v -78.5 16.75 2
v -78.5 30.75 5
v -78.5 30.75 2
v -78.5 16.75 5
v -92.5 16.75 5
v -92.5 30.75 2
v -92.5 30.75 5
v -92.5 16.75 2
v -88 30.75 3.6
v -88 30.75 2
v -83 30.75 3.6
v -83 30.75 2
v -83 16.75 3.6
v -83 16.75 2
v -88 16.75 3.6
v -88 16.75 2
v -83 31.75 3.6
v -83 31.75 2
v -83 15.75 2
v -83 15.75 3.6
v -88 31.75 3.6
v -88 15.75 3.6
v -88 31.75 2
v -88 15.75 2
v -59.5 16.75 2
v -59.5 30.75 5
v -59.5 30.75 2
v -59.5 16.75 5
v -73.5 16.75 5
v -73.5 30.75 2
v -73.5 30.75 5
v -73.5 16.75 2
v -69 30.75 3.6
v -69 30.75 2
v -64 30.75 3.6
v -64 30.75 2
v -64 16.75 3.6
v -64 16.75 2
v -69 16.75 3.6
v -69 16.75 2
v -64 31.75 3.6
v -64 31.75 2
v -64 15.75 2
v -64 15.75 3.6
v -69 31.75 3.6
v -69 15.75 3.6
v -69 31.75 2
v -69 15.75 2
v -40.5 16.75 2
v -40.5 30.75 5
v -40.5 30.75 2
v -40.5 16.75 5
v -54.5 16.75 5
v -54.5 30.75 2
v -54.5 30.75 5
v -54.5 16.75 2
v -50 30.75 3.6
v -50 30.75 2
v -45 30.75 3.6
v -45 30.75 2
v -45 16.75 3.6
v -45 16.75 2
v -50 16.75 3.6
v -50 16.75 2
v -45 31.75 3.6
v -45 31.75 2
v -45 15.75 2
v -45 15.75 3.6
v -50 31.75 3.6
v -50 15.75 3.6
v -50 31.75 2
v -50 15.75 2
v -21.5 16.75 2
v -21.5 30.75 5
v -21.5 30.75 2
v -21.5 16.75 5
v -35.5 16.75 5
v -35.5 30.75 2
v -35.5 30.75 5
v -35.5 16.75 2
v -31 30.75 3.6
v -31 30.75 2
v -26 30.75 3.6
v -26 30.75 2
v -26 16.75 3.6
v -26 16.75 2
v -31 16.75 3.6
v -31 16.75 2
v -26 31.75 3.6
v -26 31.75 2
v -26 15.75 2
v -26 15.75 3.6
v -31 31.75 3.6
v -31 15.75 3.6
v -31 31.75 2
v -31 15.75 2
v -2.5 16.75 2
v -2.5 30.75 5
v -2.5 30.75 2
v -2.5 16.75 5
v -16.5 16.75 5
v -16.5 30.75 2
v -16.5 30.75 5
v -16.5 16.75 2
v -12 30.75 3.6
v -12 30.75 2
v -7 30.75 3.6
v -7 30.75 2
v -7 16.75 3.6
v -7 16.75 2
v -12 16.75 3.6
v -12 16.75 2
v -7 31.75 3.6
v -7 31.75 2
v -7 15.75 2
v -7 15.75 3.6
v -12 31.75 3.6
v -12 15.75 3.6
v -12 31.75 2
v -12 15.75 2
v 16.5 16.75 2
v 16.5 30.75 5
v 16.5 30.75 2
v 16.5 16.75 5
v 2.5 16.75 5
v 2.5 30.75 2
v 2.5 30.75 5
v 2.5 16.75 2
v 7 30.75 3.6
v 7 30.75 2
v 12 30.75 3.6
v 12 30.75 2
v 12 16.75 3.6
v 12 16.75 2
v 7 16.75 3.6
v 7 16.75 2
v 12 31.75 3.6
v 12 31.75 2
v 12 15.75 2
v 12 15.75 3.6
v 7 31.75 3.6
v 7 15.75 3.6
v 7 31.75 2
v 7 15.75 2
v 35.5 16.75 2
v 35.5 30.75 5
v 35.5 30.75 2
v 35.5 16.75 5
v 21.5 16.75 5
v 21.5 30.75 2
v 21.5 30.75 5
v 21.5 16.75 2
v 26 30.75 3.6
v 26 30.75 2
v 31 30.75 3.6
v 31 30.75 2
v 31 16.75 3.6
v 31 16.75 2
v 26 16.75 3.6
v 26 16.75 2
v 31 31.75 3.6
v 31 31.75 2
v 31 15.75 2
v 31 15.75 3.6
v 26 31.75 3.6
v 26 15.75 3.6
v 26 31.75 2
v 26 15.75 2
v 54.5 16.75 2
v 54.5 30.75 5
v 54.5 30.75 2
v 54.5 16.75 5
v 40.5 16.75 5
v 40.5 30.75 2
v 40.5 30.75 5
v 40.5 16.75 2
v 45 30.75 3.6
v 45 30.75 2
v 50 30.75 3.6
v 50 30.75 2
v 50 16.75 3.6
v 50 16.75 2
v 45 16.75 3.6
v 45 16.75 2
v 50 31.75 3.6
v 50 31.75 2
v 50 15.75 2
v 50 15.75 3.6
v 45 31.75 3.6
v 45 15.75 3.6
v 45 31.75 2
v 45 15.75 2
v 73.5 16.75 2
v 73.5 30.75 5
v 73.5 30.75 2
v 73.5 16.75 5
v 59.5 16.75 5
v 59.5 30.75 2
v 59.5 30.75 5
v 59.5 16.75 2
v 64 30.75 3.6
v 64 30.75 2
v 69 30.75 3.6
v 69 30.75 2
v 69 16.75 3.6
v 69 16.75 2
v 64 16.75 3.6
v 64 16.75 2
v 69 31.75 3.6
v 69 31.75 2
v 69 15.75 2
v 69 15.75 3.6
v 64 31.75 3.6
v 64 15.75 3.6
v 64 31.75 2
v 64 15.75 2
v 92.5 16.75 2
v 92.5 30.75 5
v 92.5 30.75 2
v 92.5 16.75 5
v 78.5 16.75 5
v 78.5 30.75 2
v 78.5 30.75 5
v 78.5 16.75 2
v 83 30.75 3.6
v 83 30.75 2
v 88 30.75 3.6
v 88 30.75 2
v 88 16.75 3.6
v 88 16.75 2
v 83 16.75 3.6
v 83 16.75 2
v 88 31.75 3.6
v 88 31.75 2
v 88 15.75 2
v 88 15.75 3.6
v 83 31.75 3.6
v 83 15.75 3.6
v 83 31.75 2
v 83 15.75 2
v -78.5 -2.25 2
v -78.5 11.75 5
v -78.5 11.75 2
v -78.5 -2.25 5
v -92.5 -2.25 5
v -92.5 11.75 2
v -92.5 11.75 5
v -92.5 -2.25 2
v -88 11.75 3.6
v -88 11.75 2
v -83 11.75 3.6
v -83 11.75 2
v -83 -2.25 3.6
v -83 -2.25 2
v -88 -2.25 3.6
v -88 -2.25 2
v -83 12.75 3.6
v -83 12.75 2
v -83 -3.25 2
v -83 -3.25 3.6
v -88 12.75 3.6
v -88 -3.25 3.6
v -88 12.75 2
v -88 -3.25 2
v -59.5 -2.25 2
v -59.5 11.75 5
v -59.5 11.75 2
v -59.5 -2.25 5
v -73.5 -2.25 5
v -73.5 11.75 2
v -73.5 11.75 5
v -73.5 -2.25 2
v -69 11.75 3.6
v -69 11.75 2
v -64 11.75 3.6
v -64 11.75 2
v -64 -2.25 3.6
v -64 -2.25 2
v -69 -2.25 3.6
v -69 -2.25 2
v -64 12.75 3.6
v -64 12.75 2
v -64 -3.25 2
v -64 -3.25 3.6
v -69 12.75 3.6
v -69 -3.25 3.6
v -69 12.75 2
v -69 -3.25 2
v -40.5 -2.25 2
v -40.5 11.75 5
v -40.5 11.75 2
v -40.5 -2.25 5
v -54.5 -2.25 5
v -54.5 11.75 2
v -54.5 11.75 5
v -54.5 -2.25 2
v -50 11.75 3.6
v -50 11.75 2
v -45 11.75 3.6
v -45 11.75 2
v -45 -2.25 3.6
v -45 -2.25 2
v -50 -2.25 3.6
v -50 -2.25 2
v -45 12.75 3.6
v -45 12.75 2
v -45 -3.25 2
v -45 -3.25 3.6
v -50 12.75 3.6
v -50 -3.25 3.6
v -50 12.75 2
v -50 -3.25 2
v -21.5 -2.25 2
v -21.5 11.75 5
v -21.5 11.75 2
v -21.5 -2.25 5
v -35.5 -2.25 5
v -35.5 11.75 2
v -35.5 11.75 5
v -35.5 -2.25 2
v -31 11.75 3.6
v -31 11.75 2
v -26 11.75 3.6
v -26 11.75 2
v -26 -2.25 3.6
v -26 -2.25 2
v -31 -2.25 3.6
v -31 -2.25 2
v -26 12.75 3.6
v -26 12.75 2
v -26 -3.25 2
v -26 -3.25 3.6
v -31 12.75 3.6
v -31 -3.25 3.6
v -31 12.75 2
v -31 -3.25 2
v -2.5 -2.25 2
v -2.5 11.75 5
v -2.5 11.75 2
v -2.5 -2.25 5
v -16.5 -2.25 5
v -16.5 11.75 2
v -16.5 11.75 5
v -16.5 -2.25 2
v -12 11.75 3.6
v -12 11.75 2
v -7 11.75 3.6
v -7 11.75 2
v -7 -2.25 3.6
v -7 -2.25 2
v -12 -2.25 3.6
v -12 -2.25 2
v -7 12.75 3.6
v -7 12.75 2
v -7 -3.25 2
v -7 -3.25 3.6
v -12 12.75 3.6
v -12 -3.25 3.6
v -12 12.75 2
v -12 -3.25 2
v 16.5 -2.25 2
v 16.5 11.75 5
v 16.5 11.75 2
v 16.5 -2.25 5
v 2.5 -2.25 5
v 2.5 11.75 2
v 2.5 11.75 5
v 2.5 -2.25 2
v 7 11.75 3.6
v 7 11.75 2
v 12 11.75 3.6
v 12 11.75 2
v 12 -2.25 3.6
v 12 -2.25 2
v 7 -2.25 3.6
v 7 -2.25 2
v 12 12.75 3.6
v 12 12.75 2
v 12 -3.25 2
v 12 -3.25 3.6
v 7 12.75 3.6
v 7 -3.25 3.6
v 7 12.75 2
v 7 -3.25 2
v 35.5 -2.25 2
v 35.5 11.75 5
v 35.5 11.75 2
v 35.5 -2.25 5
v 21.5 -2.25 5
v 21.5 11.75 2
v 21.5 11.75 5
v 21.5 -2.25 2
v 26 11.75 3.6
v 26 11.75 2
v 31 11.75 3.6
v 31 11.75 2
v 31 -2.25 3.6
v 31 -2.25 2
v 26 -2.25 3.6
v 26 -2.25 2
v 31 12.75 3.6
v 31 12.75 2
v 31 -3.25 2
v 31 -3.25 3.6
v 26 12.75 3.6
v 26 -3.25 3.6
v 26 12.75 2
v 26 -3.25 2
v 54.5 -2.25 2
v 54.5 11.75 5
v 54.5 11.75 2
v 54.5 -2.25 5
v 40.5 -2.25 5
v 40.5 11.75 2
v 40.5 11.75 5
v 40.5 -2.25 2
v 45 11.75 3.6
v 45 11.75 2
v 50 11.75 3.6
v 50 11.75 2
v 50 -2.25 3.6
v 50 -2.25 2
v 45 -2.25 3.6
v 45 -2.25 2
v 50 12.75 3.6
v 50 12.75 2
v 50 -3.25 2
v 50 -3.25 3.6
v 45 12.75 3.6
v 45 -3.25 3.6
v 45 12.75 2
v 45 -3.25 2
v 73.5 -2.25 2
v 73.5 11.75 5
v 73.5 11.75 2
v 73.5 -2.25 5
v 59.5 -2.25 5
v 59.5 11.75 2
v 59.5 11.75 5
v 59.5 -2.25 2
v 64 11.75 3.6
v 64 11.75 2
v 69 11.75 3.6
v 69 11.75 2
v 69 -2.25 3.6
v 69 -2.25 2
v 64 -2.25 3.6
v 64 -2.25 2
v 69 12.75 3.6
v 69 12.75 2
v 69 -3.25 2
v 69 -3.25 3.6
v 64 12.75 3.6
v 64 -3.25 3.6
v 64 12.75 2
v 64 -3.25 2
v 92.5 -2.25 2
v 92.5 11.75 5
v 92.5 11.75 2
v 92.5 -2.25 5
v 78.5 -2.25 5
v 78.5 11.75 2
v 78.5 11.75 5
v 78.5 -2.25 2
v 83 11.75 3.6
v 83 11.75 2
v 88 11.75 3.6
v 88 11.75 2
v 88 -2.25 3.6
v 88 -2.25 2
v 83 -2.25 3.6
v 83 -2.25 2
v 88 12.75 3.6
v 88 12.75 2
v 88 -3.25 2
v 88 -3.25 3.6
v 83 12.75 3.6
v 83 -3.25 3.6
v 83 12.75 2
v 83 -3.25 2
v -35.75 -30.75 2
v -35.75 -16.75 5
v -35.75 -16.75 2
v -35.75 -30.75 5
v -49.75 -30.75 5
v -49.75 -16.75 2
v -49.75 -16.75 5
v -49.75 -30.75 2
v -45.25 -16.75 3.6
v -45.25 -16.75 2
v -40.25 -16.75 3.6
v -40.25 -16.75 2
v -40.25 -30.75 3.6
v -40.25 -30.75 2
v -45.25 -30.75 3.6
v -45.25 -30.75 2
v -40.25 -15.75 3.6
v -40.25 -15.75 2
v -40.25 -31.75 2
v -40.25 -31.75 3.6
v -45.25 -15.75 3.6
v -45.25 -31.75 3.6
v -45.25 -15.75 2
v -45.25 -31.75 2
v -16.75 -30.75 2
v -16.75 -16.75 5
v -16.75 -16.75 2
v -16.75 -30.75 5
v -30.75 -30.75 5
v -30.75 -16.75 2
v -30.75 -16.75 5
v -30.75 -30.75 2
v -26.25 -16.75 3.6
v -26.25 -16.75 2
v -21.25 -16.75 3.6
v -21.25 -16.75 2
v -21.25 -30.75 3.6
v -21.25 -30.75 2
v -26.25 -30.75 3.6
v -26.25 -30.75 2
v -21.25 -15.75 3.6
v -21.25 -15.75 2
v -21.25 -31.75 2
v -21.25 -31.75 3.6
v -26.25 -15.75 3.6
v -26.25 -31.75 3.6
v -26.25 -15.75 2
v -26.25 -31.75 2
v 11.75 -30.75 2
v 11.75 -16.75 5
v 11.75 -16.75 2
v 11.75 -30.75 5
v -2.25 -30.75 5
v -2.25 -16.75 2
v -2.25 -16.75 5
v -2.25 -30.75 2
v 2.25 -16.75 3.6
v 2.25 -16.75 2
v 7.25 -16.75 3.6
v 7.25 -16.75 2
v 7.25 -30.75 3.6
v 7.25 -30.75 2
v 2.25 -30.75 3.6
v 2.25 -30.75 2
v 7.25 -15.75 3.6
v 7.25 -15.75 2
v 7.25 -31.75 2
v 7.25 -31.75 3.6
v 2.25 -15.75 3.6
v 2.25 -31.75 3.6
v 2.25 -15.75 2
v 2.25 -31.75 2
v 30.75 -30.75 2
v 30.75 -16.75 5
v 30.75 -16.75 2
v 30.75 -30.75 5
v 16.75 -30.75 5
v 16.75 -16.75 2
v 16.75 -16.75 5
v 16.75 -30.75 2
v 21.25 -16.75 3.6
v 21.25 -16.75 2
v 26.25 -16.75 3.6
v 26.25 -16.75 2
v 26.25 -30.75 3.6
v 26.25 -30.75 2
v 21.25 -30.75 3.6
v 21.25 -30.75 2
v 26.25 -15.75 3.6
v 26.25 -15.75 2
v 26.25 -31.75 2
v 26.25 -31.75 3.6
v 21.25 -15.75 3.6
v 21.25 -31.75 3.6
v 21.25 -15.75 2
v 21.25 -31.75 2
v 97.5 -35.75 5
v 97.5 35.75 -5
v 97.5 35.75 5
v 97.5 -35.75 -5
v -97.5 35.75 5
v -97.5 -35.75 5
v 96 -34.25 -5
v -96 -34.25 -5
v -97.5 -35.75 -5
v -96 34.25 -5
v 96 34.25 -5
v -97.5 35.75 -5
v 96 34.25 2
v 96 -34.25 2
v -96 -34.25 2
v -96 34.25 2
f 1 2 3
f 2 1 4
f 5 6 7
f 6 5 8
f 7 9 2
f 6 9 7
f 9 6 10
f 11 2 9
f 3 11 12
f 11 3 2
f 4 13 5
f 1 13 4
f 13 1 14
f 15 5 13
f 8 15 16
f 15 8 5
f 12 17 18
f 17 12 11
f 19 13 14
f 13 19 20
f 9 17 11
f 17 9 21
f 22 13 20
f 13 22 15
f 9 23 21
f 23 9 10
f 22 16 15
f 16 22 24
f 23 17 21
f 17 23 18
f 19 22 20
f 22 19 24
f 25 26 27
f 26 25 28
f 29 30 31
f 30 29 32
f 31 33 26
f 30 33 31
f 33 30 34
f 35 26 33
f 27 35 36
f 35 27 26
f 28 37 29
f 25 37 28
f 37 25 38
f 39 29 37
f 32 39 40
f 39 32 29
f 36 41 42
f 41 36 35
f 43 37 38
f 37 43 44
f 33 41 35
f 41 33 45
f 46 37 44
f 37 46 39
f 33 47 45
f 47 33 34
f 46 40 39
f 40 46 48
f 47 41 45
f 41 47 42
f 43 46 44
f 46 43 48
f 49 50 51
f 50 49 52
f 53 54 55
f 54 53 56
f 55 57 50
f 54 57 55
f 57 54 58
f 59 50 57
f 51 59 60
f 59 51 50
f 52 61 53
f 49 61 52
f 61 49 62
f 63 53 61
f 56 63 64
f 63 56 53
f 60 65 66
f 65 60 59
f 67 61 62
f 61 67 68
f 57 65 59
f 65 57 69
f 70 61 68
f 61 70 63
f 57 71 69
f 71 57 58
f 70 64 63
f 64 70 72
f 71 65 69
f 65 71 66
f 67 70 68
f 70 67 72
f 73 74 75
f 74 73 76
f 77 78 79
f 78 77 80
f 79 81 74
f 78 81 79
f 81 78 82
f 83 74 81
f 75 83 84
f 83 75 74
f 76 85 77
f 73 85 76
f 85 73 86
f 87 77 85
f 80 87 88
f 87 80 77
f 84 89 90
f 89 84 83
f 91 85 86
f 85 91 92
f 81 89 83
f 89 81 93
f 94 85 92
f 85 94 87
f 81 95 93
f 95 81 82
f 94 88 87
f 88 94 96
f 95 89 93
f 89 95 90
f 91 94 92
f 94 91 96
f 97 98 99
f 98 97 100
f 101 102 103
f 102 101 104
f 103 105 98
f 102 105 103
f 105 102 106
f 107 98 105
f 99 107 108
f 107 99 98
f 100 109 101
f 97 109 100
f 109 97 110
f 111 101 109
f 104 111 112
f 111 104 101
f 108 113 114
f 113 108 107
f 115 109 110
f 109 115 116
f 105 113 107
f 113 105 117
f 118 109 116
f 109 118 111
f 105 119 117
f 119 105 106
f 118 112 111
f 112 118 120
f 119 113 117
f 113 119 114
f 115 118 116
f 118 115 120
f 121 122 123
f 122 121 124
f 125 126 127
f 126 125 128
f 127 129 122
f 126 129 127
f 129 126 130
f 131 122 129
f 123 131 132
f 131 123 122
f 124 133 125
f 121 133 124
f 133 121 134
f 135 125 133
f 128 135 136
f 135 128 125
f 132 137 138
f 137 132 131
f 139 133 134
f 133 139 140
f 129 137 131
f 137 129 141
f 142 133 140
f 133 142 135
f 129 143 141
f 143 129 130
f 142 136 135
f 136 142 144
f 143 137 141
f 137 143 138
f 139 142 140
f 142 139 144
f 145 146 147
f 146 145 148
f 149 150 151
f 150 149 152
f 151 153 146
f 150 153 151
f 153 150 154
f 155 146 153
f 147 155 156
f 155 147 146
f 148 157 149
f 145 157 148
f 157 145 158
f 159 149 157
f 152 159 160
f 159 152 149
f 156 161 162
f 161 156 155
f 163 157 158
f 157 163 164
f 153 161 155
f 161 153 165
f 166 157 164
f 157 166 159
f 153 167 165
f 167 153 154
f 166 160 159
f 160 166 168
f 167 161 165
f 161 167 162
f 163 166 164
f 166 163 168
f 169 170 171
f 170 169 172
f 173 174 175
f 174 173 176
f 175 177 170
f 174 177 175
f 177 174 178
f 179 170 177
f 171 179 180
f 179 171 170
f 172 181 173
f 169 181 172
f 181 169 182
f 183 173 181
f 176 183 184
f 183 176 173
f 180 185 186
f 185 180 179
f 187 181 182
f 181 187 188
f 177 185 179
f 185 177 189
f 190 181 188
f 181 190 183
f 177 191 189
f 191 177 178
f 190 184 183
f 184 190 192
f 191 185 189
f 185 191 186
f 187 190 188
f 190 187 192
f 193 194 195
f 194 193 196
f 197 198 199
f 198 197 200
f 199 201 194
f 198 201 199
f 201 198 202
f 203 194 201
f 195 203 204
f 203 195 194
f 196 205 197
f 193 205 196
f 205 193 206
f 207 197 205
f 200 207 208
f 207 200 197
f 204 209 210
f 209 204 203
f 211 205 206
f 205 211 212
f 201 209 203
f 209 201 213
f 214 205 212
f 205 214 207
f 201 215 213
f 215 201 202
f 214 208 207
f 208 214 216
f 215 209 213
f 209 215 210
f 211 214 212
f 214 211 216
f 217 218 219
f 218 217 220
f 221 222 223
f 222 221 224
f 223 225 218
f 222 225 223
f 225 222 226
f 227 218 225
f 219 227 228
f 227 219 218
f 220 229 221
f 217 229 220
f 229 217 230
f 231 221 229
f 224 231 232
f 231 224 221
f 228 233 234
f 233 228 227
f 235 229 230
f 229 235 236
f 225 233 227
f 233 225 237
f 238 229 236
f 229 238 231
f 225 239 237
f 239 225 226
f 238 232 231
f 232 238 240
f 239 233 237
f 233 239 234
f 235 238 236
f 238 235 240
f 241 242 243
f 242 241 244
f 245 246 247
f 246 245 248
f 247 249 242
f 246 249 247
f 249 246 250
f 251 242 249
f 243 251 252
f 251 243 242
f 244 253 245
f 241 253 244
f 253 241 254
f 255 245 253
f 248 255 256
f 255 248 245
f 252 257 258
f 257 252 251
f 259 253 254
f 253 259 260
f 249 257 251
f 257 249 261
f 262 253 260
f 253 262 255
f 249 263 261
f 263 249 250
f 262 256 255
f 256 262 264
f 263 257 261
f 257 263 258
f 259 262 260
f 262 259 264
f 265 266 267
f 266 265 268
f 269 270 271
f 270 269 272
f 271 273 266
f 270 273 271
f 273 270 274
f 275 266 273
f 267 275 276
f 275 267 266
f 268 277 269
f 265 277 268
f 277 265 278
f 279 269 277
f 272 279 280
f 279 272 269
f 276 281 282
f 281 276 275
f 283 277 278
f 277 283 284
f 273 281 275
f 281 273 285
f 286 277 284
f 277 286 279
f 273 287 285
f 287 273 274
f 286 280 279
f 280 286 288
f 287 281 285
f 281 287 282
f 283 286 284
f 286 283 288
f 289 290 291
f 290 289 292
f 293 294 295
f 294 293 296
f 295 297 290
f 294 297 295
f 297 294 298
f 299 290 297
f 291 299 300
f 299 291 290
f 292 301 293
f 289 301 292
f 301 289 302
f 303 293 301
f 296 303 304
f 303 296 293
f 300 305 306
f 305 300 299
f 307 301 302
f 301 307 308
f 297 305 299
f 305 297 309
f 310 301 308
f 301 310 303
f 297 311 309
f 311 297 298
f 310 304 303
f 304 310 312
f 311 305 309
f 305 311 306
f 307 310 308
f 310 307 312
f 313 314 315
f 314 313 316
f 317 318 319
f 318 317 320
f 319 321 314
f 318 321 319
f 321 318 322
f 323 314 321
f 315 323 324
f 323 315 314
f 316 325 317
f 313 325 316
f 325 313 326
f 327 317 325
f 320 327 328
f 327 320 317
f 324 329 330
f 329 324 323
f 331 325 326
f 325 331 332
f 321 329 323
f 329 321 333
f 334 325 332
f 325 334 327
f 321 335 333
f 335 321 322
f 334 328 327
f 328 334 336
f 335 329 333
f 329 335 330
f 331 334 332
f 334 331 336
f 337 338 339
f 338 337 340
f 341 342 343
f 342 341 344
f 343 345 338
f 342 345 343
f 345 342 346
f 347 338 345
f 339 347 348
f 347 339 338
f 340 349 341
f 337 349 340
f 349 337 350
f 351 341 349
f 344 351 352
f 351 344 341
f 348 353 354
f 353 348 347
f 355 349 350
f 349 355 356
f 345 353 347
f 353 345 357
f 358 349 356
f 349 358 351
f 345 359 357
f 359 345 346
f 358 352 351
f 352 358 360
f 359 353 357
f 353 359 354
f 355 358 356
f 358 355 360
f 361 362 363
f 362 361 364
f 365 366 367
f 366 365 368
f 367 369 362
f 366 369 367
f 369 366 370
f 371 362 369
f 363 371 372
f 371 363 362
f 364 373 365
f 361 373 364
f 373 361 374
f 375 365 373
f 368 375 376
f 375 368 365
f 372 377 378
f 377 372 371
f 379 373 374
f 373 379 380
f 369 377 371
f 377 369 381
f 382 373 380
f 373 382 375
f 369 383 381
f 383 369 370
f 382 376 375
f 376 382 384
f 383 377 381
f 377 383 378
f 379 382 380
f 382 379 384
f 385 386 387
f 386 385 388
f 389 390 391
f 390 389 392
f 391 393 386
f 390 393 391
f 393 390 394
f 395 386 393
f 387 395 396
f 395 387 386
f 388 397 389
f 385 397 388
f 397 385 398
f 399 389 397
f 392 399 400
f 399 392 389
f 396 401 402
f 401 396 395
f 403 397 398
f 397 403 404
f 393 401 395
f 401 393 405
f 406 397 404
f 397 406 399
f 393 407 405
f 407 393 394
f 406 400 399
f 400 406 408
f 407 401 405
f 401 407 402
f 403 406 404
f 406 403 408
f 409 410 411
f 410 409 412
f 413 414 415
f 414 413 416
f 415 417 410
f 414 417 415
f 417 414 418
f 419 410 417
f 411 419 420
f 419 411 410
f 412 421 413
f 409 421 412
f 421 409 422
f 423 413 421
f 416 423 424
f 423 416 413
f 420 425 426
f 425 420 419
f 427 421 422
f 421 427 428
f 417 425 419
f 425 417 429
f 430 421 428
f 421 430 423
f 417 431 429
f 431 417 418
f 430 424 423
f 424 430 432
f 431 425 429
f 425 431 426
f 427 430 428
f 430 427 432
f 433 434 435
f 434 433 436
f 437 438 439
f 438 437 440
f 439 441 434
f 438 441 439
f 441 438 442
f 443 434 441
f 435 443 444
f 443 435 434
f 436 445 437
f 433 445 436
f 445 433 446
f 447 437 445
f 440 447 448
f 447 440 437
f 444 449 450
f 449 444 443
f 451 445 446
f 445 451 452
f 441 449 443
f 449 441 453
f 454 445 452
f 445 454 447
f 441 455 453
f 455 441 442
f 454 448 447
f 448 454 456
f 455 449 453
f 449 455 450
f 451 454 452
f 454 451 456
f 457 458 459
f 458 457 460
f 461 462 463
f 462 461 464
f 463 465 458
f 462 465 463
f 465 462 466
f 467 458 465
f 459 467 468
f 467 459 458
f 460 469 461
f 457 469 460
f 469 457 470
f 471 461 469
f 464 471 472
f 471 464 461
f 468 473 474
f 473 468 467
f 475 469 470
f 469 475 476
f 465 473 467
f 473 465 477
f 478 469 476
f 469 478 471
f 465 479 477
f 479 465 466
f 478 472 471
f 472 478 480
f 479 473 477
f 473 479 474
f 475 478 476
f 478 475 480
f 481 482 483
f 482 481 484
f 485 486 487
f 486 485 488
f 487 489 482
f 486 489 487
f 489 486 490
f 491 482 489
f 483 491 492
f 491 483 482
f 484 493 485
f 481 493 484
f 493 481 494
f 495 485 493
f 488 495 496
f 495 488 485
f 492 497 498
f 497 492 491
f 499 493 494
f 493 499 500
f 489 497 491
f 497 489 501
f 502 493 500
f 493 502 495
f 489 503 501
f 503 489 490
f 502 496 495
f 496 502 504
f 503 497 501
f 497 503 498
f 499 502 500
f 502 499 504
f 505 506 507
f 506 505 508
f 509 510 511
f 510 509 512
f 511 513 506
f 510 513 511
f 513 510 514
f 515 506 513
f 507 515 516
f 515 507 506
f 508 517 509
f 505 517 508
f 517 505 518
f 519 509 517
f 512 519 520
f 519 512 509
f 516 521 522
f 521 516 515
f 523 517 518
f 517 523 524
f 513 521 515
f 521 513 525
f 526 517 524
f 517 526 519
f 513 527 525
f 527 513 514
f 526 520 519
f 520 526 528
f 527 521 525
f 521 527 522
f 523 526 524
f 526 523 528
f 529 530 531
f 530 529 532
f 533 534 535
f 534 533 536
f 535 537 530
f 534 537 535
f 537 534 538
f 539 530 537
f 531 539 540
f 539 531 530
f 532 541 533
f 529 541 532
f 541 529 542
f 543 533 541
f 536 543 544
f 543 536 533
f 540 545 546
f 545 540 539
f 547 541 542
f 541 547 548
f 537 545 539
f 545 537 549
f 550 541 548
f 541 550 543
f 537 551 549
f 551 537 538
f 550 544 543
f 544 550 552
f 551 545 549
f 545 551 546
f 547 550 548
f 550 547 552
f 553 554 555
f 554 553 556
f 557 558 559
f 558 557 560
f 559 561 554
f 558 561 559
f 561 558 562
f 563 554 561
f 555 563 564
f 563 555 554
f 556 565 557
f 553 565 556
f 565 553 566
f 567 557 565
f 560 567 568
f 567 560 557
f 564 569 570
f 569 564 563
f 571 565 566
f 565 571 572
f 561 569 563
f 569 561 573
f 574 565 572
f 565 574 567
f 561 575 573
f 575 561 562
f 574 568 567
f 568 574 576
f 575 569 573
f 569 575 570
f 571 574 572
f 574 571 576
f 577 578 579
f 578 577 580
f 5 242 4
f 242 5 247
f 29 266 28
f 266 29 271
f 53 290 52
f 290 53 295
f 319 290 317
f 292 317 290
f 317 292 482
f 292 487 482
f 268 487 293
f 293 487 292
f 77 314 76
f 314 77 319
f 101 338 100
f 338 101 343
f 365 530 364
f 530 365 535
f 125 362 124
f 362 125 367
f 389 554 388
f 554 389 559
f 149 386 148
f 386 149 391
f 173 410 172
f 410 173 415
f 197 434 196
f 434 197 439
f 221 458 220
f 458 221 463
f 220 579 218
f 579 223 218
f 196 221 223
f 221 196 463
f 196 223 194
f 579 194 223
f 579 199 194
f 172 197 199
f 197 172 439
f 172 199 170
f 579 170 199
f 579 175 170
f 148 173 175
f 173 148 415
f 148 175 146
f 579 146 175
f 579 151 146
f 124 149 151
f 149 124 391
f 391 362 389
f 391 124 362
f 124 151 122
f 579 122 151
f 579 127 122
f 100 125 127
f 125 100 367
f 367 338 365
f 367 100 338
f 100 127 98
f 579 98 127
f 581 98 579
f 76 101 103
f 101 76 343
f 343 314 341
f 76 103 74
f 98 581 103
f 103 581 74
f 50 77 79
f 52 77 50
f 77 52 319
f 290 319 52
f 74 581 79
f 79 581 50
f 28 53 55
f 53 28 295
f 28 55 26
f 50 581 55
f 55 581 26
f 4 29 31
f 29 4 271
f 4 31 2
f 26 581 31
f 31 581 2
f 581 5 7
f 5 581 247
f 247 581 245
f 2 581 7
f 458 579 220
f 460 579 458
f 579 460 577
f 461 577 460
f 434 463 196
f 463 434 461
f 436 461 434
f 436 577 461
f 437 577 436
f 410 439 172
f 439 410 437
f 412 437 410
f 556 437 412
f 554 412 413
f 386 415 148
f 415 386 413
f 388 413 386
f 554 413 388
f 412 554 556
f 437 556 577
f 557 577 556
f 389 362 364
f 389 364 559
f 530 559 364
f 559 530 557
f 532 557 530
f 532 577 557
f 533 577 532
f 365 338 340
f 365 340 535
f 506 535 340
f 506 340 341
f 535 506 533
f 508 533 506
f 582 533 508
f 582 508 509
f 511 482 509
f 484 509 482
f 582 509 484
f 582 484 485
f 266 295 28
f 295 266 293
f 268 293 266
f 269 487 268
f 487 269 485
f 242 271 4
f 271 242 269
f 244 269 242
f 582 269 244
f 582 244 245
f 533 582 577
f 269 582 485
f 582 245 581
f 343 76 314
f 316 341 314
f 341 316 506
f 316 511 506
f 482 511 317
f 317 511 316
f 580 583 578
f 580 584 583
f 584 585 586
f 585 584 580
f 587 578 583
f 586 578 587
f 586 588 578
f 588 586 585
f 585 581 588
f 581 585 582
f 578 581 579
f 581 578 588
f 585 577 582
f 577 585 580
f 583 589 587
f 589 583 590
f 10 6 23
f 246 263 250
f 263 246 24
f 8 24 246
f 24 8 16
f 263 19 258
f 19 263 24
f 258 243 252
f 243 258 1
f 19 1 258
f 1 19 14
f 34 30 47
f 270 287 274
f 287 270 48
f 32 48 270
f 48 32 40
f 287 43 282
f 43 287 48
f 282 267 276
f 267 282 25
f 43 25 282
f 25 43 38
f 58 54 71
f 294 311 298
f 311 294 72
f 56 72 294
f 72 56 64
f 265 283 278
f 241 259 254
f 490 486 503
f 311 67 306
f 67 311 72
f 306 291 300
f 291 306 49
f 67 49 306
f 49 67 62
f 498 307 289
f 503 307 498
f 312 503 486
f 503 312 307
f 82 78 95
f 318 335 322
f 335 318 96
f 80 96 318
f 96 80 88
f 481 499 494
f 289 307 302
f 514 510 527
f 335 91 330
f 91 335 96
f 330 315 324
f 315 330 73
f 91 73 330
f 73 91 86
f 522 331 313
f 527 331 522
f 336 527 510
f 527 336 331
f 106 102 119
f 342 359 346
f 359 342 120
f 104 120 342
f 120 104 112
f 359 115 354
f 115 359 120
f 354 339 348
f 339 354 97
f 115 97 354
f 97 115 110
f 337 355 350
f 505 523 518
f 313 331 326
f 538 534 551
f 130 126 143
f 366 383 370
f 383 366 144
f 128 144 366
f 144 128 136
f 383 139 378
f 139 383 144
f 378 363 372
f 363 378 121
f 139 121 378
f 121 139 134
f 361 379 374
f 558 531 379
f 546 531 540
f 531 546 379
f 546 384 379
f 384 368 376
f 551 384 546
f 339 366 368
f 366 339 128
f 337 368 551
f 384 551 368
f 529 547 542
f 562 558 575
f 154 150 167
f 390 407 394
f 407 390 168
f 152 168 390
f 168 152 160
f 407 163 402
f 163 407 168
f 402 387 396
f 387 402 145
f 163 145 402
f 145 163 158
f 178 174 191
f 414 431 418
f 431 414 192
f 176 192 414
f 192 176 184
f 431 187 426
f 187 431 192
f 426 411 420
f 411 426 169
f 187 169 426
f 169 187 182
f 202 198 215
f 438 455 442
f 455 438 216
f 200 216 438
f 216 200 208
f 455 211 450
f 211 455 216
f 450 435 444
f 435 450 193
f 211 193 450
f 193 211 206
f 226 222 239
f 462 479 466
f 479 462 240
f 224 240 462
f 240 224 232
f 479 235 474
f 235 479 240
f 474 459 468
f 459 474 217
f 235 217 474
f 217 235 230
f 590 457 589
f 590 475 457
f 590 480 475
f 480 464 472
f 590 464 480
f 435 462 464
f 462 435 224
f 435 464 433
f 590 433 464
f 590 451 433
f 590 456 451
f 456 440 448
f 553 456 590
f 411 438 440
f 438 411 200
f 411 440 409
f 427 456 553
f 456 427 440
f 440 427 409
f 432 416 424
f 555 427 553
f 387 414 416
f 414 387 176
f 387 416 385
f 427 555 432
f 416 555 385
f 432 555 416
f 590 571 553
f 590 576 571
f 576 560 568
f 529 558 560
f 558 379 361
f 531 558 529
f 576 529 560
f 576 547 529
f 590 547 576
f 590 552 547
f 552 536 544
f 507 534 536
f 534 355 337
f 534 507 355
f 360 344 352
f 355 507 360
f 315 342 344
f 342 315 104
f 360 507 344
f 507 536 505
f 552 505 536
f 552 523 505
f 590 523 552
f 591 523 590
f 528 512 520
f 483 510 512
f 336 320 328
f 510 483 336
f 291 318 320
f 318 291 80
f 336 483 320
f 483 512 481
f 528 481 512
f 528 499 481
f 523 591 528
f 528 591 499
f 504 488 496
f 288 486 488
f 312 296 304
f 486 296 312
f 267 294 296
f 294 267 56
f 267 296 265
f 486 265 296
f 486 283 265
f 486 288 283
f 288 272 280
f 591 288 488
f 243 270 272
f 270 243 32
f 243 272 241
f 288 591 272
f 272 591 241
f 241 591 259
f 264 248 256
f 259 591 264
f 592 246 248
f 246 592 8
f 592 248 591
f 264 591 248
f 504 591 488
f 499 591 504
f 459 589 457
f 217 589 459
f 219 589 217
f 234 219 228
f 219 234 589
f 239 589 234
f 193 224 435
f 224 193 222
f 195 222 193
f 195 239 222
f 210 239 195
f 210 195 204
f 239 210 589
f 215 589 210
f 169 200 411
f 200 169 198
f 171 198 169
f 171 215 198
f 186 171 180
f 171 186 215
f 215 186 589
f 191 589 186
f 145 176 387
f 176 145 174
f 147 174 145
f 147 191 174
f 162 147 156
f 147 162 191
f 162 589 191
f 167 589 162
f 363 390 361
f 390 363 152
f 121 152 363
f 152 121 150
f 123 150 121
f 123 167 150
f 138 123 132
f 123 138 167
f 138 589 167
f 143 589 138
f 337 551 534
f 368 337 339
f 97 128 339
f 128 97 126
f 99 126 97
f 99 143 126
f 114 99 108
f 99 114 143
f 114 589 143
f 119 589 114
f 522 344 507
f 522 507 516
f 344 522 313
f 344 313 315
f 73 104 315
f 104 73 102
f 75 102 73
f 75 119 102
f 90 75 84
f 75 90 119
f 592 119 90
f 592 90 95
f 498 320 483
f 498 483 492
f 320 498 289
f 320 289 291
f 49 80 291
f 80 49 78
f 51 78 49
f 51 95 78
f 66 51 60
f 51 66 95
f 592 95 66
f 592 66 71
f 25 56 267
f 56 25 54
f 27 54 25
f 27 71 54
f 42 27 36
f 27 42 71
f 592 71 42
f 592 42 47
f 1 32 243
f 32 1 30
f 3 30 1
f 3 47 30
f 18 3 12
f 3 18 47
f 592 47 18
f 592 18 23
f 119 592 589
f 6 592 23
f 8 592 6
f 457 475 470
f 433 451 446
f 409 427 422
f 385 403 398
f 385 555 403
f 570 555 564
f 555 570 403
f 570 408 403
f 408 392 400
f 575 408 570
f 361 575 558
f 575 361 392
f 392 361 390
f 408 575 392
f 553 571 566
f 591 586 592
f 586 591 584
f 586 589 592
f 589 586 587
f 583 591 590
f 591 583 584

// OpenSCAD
cap_w = 19;
switch_w = 14;
switch_t = 1.4; // thickness of the "plate" that the switches clip into
kb_l = cap_w * 10 + (cap_w - switch_w);
kb_w = cap_w * 3.5 + (cap_w - switch_w);
kb_h = 10;
thickness = 3;

switch_positions = [
  // top row
  [-4.5, 1.25],
  [-3.5, 1.25],
  [-3.5, 1.25],
  [-2.5, 1.25],
  [-1.5, 1.25],
  [-0.5, 1.25],
  [ 0.5, 1.25],
  [ 1.5, 1.25],
  [ 2.5, 1.25],
  [ 3.5, 1.25],
  [ 4.5, 1.25],
  
  // second row
  [-4.5, 0.25],
  [-3.5, 0.25],
  [-3.5, 0.25],
  [-2.5, 0.25],
  [-1.5, 0.25],
  [-0.5, 0.25],
  [ 0.5, 0.25],
  [ 1.5, 0.25],
  [ 2.5, 0.25],
  [ 3.5, 0.25],
  [ 4.5, 0.25],

  // thumb row
  [-2.25, -1.25],
  [-1.25, -1.25],
  [ 0.25, -1.25],
  [ 1.25, -1.25],
];

difference() {
  // keyboard shell
  cube([kb_l, kb_w, kb_h], center = true);

  // key switches
  for (pos = switch_positions) {
    // the hole for the switch
    translate([pos[0] * cap_w, pos[1] * cap_w, 0]) {
      cube(switch_w, center = true);
    }

    // the thin spots in the switch plate
    translate([pos[0] * cap_w, pos[1] * cap_w, 0]) {
      cube([5, switch_w + 2, kb_h - switch_t * 2], center = true);
    }
  }

  // make the keyboard shell hollow
  translate([0, 0, -thickness]) {
    cube([kb_l - thickness, kb_w - thickness, kb_h], center = true);
  }
}
